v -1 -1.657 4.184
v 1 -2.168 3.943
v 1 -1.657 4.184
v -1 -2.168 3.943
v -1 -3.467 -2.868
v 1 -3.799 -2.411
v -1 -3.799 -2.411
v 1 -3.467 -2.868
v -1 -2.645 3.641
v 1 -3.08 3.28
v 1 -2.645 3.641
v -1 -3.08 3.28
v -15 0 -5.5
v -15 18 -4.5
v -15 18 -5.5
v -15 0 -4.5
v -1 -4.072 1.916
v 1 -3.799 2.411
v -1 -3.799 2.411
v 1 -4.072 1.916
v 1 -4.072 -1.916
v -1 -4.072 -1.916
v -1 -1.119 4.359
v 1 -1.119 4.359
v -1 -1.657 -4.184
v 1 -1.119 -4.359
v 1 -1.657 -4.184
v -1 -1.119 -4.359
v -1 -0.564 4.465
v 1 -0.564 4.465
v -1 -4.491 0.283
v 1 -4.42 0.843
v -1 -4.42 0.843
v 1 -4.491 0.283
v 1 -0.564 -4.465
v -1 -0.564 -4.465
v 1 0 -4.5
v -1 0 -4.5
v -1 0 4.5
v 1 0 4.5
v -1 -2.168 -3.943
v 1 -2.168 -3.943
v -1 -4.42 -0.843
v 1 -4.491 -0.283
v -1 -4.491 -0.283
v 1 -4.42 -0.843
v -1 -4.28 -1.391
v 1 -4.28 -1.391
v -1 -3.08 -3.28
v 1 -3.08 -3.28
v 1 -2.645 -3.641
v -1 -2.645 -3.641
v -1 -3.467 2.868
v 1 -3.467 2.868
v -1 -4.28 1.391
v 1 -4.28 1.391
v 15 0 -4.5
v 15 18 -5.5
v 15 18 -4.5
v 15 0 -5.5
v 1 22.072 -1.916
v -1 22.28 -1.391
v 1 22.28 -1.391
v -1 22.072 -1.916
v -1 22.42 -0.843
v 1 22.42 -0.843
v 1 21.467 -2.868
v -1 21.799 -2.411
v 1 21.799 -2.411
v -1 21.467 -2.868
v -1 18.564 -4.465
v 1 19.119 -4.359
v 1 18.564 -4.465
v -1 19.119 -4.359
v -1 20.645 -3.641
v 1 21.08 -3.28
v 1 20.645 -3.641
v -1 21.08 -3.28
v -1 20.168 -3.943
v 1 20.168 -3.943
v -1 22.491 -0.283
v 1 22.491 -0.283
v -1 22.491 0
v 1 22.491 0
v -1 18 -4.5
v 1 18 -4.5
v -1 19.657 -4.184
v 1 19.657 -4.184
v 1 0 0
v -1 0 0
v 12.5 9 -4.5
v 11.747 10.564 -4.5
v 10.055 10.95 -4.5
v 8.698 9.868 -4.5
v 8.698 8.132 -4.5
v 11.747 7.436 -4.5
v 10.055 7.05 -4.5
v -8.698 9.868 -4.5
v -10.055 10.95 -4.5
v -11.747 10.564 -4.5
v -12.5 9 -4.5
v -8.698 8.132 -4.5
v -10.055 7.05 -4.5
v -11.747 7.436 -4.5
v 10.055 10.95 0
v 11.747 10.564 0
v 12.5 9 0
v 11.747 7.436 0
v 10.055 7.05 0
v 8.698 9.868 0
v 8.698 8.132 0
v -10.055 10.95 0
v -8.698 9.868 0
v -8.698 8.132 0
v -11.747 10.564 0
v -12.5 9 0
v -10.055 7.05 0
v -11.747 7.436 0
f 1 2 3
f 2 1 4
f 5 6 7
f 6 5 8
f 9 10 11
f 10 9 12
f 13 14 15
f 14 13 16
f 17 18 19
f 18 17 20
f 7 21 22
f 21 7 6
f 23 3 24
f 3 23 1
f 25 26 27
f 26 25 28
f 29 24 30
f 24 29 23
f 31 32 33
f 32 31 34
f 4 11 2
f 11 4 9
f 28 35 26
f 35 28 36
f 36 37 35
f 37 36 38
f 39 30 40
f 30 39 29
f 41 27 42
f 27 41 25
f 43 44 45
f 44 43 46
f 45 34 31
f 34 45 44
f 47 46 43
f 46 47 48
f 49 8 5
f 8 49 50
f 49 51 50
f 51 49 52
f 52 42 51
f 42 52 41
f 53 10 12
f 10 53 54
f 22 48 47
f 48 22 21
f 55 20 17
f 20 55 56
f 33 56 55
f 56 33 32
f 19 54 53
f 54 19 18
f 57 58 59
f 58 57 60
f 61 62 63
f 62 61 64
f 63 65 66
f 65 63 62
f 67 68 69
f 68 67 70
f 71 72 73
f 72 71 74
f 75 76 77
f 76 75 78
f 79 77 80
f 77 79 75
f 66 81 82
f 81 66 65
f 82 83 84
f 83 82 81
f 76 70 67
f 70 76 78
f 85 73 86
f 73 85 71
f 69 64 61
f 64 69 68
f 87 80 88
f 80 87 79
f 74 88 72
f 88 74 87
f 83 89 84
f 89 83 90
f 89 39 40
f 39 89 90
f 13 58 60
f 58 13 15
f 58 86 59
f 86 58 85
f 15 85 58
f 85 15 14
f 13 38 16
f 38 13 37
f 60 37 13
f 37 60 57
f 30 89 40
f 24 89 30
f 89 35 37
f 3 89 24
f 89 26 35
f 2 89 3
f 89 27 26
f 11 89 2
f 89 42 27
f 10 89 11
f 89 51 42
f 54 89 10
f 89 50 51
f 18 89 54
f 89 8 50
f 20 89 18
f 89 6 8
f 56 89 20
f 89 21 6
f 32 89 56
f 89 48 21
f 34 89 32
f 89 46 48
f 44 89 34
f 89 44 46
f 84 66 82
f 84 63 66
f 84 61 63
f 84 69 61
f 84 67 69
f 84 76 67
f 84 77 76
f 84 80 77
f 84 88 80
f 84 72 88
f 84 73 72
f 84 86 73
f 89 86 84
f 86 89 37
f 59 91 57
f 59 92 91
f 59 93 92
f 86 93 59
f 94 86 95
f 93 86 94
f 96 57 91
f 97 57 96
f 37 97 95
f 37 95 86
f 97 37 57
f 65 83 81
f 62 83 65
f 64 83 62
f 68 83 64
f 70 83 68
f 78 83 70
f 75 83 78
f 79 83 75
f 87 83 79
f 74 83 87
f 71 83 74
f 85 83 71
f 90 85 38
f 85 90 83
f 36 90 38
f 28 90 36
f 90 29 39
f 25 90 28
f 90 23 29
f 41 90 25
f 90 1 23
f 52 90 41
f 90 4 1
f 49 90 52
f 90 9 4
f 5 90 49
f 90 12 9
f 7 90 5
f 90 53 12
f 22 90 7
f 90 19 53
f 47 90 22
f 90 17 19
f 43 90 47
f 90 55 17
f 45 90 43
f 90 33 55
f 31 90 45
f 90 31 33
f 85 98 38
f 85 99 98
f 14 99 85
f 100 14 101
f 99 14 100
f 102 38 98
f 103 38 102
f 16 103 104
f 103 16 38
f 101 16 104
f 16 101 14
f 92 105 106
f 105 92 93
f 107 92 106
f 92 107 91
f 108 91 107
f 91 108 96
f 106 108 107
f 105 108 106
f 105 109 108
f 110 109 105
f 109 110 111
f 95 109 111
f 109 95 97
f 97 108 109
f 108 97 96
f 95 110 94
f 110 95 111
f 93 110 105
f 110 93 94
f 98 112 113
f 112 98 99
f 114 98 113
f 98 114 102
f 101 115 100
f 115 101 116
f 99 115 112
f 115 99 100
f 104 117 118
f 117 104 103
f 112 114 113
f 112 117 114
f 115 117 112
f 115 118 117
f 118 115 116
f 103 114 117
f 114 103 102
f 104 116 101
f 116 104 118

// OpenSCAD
module lozenge(radius = 4.5, depth = 18, length = 20, $fn = 50) {
    difference() {
        union() {
            cylinder(r = radius, h = length, $fn = $fn);
            translate([-radius, 0, 0]) cube([radius * 2, depth, length]);
            translate([0, depth, 0]) cylinder(r = radius, h = length, $fn = $fn);
        }
        union() {
            cube([radius * 2, depth + radius, length]);
        }
    }
}

module mid_section() {
    difference() {
        union() {
            // make the outer shell
            translate([15, 0, 0]) rotate([0, 270, 0]) lozenge(length = 30);
            translate([-15, 0, -5.5]) cube([30, 18, 2]);
        }
        union() {
            // subtract the wood
            mirror([1, 0, 0]) translate([21, 0, 0]) rotate([0, 270, 0]) lozenge(length = 20);
            translate([21, 0, 0]) rotate([0, 270, 0]) lozenge(length = 20);
        }
    }

    translate([10.5, 9, -4.5]) cylinder(r = 2, h = 4.5);
    mirror([1, 0, 0]) translate([10.5, 9, -4.5]) cylinder(r = 2, h = 4.5);
}


module corner_edge() {
    translate([22.5, 0, 0]) {
        difference() {
            union() {
                // make the outer shell
                translate([15, 0, 0]) rotate([0, 270, 0]) lozenge(length = 15+22.5);
                translate([-22.5, 0, -5.5]) cube([15+22.5, 18, 2]);
            }
            union() {
                // subtract the wood
                translate([20, 0, 0]) rotate([0, 270, 0]) lozenge(length = 20);
            }
        }

        translate([10.5, 9, -4.5]) cylinder(r = 2, h = 4.5);
    }
}

module corner() {
    rotate([0, 0, 270]) mirror([1, 0, 0]) corner_edge();
    corner_edge();
    difference() {
        sphere(r = 4.5, $fn = 50);
        cube([5, 5, 5]);
    }
}

mid_section();
